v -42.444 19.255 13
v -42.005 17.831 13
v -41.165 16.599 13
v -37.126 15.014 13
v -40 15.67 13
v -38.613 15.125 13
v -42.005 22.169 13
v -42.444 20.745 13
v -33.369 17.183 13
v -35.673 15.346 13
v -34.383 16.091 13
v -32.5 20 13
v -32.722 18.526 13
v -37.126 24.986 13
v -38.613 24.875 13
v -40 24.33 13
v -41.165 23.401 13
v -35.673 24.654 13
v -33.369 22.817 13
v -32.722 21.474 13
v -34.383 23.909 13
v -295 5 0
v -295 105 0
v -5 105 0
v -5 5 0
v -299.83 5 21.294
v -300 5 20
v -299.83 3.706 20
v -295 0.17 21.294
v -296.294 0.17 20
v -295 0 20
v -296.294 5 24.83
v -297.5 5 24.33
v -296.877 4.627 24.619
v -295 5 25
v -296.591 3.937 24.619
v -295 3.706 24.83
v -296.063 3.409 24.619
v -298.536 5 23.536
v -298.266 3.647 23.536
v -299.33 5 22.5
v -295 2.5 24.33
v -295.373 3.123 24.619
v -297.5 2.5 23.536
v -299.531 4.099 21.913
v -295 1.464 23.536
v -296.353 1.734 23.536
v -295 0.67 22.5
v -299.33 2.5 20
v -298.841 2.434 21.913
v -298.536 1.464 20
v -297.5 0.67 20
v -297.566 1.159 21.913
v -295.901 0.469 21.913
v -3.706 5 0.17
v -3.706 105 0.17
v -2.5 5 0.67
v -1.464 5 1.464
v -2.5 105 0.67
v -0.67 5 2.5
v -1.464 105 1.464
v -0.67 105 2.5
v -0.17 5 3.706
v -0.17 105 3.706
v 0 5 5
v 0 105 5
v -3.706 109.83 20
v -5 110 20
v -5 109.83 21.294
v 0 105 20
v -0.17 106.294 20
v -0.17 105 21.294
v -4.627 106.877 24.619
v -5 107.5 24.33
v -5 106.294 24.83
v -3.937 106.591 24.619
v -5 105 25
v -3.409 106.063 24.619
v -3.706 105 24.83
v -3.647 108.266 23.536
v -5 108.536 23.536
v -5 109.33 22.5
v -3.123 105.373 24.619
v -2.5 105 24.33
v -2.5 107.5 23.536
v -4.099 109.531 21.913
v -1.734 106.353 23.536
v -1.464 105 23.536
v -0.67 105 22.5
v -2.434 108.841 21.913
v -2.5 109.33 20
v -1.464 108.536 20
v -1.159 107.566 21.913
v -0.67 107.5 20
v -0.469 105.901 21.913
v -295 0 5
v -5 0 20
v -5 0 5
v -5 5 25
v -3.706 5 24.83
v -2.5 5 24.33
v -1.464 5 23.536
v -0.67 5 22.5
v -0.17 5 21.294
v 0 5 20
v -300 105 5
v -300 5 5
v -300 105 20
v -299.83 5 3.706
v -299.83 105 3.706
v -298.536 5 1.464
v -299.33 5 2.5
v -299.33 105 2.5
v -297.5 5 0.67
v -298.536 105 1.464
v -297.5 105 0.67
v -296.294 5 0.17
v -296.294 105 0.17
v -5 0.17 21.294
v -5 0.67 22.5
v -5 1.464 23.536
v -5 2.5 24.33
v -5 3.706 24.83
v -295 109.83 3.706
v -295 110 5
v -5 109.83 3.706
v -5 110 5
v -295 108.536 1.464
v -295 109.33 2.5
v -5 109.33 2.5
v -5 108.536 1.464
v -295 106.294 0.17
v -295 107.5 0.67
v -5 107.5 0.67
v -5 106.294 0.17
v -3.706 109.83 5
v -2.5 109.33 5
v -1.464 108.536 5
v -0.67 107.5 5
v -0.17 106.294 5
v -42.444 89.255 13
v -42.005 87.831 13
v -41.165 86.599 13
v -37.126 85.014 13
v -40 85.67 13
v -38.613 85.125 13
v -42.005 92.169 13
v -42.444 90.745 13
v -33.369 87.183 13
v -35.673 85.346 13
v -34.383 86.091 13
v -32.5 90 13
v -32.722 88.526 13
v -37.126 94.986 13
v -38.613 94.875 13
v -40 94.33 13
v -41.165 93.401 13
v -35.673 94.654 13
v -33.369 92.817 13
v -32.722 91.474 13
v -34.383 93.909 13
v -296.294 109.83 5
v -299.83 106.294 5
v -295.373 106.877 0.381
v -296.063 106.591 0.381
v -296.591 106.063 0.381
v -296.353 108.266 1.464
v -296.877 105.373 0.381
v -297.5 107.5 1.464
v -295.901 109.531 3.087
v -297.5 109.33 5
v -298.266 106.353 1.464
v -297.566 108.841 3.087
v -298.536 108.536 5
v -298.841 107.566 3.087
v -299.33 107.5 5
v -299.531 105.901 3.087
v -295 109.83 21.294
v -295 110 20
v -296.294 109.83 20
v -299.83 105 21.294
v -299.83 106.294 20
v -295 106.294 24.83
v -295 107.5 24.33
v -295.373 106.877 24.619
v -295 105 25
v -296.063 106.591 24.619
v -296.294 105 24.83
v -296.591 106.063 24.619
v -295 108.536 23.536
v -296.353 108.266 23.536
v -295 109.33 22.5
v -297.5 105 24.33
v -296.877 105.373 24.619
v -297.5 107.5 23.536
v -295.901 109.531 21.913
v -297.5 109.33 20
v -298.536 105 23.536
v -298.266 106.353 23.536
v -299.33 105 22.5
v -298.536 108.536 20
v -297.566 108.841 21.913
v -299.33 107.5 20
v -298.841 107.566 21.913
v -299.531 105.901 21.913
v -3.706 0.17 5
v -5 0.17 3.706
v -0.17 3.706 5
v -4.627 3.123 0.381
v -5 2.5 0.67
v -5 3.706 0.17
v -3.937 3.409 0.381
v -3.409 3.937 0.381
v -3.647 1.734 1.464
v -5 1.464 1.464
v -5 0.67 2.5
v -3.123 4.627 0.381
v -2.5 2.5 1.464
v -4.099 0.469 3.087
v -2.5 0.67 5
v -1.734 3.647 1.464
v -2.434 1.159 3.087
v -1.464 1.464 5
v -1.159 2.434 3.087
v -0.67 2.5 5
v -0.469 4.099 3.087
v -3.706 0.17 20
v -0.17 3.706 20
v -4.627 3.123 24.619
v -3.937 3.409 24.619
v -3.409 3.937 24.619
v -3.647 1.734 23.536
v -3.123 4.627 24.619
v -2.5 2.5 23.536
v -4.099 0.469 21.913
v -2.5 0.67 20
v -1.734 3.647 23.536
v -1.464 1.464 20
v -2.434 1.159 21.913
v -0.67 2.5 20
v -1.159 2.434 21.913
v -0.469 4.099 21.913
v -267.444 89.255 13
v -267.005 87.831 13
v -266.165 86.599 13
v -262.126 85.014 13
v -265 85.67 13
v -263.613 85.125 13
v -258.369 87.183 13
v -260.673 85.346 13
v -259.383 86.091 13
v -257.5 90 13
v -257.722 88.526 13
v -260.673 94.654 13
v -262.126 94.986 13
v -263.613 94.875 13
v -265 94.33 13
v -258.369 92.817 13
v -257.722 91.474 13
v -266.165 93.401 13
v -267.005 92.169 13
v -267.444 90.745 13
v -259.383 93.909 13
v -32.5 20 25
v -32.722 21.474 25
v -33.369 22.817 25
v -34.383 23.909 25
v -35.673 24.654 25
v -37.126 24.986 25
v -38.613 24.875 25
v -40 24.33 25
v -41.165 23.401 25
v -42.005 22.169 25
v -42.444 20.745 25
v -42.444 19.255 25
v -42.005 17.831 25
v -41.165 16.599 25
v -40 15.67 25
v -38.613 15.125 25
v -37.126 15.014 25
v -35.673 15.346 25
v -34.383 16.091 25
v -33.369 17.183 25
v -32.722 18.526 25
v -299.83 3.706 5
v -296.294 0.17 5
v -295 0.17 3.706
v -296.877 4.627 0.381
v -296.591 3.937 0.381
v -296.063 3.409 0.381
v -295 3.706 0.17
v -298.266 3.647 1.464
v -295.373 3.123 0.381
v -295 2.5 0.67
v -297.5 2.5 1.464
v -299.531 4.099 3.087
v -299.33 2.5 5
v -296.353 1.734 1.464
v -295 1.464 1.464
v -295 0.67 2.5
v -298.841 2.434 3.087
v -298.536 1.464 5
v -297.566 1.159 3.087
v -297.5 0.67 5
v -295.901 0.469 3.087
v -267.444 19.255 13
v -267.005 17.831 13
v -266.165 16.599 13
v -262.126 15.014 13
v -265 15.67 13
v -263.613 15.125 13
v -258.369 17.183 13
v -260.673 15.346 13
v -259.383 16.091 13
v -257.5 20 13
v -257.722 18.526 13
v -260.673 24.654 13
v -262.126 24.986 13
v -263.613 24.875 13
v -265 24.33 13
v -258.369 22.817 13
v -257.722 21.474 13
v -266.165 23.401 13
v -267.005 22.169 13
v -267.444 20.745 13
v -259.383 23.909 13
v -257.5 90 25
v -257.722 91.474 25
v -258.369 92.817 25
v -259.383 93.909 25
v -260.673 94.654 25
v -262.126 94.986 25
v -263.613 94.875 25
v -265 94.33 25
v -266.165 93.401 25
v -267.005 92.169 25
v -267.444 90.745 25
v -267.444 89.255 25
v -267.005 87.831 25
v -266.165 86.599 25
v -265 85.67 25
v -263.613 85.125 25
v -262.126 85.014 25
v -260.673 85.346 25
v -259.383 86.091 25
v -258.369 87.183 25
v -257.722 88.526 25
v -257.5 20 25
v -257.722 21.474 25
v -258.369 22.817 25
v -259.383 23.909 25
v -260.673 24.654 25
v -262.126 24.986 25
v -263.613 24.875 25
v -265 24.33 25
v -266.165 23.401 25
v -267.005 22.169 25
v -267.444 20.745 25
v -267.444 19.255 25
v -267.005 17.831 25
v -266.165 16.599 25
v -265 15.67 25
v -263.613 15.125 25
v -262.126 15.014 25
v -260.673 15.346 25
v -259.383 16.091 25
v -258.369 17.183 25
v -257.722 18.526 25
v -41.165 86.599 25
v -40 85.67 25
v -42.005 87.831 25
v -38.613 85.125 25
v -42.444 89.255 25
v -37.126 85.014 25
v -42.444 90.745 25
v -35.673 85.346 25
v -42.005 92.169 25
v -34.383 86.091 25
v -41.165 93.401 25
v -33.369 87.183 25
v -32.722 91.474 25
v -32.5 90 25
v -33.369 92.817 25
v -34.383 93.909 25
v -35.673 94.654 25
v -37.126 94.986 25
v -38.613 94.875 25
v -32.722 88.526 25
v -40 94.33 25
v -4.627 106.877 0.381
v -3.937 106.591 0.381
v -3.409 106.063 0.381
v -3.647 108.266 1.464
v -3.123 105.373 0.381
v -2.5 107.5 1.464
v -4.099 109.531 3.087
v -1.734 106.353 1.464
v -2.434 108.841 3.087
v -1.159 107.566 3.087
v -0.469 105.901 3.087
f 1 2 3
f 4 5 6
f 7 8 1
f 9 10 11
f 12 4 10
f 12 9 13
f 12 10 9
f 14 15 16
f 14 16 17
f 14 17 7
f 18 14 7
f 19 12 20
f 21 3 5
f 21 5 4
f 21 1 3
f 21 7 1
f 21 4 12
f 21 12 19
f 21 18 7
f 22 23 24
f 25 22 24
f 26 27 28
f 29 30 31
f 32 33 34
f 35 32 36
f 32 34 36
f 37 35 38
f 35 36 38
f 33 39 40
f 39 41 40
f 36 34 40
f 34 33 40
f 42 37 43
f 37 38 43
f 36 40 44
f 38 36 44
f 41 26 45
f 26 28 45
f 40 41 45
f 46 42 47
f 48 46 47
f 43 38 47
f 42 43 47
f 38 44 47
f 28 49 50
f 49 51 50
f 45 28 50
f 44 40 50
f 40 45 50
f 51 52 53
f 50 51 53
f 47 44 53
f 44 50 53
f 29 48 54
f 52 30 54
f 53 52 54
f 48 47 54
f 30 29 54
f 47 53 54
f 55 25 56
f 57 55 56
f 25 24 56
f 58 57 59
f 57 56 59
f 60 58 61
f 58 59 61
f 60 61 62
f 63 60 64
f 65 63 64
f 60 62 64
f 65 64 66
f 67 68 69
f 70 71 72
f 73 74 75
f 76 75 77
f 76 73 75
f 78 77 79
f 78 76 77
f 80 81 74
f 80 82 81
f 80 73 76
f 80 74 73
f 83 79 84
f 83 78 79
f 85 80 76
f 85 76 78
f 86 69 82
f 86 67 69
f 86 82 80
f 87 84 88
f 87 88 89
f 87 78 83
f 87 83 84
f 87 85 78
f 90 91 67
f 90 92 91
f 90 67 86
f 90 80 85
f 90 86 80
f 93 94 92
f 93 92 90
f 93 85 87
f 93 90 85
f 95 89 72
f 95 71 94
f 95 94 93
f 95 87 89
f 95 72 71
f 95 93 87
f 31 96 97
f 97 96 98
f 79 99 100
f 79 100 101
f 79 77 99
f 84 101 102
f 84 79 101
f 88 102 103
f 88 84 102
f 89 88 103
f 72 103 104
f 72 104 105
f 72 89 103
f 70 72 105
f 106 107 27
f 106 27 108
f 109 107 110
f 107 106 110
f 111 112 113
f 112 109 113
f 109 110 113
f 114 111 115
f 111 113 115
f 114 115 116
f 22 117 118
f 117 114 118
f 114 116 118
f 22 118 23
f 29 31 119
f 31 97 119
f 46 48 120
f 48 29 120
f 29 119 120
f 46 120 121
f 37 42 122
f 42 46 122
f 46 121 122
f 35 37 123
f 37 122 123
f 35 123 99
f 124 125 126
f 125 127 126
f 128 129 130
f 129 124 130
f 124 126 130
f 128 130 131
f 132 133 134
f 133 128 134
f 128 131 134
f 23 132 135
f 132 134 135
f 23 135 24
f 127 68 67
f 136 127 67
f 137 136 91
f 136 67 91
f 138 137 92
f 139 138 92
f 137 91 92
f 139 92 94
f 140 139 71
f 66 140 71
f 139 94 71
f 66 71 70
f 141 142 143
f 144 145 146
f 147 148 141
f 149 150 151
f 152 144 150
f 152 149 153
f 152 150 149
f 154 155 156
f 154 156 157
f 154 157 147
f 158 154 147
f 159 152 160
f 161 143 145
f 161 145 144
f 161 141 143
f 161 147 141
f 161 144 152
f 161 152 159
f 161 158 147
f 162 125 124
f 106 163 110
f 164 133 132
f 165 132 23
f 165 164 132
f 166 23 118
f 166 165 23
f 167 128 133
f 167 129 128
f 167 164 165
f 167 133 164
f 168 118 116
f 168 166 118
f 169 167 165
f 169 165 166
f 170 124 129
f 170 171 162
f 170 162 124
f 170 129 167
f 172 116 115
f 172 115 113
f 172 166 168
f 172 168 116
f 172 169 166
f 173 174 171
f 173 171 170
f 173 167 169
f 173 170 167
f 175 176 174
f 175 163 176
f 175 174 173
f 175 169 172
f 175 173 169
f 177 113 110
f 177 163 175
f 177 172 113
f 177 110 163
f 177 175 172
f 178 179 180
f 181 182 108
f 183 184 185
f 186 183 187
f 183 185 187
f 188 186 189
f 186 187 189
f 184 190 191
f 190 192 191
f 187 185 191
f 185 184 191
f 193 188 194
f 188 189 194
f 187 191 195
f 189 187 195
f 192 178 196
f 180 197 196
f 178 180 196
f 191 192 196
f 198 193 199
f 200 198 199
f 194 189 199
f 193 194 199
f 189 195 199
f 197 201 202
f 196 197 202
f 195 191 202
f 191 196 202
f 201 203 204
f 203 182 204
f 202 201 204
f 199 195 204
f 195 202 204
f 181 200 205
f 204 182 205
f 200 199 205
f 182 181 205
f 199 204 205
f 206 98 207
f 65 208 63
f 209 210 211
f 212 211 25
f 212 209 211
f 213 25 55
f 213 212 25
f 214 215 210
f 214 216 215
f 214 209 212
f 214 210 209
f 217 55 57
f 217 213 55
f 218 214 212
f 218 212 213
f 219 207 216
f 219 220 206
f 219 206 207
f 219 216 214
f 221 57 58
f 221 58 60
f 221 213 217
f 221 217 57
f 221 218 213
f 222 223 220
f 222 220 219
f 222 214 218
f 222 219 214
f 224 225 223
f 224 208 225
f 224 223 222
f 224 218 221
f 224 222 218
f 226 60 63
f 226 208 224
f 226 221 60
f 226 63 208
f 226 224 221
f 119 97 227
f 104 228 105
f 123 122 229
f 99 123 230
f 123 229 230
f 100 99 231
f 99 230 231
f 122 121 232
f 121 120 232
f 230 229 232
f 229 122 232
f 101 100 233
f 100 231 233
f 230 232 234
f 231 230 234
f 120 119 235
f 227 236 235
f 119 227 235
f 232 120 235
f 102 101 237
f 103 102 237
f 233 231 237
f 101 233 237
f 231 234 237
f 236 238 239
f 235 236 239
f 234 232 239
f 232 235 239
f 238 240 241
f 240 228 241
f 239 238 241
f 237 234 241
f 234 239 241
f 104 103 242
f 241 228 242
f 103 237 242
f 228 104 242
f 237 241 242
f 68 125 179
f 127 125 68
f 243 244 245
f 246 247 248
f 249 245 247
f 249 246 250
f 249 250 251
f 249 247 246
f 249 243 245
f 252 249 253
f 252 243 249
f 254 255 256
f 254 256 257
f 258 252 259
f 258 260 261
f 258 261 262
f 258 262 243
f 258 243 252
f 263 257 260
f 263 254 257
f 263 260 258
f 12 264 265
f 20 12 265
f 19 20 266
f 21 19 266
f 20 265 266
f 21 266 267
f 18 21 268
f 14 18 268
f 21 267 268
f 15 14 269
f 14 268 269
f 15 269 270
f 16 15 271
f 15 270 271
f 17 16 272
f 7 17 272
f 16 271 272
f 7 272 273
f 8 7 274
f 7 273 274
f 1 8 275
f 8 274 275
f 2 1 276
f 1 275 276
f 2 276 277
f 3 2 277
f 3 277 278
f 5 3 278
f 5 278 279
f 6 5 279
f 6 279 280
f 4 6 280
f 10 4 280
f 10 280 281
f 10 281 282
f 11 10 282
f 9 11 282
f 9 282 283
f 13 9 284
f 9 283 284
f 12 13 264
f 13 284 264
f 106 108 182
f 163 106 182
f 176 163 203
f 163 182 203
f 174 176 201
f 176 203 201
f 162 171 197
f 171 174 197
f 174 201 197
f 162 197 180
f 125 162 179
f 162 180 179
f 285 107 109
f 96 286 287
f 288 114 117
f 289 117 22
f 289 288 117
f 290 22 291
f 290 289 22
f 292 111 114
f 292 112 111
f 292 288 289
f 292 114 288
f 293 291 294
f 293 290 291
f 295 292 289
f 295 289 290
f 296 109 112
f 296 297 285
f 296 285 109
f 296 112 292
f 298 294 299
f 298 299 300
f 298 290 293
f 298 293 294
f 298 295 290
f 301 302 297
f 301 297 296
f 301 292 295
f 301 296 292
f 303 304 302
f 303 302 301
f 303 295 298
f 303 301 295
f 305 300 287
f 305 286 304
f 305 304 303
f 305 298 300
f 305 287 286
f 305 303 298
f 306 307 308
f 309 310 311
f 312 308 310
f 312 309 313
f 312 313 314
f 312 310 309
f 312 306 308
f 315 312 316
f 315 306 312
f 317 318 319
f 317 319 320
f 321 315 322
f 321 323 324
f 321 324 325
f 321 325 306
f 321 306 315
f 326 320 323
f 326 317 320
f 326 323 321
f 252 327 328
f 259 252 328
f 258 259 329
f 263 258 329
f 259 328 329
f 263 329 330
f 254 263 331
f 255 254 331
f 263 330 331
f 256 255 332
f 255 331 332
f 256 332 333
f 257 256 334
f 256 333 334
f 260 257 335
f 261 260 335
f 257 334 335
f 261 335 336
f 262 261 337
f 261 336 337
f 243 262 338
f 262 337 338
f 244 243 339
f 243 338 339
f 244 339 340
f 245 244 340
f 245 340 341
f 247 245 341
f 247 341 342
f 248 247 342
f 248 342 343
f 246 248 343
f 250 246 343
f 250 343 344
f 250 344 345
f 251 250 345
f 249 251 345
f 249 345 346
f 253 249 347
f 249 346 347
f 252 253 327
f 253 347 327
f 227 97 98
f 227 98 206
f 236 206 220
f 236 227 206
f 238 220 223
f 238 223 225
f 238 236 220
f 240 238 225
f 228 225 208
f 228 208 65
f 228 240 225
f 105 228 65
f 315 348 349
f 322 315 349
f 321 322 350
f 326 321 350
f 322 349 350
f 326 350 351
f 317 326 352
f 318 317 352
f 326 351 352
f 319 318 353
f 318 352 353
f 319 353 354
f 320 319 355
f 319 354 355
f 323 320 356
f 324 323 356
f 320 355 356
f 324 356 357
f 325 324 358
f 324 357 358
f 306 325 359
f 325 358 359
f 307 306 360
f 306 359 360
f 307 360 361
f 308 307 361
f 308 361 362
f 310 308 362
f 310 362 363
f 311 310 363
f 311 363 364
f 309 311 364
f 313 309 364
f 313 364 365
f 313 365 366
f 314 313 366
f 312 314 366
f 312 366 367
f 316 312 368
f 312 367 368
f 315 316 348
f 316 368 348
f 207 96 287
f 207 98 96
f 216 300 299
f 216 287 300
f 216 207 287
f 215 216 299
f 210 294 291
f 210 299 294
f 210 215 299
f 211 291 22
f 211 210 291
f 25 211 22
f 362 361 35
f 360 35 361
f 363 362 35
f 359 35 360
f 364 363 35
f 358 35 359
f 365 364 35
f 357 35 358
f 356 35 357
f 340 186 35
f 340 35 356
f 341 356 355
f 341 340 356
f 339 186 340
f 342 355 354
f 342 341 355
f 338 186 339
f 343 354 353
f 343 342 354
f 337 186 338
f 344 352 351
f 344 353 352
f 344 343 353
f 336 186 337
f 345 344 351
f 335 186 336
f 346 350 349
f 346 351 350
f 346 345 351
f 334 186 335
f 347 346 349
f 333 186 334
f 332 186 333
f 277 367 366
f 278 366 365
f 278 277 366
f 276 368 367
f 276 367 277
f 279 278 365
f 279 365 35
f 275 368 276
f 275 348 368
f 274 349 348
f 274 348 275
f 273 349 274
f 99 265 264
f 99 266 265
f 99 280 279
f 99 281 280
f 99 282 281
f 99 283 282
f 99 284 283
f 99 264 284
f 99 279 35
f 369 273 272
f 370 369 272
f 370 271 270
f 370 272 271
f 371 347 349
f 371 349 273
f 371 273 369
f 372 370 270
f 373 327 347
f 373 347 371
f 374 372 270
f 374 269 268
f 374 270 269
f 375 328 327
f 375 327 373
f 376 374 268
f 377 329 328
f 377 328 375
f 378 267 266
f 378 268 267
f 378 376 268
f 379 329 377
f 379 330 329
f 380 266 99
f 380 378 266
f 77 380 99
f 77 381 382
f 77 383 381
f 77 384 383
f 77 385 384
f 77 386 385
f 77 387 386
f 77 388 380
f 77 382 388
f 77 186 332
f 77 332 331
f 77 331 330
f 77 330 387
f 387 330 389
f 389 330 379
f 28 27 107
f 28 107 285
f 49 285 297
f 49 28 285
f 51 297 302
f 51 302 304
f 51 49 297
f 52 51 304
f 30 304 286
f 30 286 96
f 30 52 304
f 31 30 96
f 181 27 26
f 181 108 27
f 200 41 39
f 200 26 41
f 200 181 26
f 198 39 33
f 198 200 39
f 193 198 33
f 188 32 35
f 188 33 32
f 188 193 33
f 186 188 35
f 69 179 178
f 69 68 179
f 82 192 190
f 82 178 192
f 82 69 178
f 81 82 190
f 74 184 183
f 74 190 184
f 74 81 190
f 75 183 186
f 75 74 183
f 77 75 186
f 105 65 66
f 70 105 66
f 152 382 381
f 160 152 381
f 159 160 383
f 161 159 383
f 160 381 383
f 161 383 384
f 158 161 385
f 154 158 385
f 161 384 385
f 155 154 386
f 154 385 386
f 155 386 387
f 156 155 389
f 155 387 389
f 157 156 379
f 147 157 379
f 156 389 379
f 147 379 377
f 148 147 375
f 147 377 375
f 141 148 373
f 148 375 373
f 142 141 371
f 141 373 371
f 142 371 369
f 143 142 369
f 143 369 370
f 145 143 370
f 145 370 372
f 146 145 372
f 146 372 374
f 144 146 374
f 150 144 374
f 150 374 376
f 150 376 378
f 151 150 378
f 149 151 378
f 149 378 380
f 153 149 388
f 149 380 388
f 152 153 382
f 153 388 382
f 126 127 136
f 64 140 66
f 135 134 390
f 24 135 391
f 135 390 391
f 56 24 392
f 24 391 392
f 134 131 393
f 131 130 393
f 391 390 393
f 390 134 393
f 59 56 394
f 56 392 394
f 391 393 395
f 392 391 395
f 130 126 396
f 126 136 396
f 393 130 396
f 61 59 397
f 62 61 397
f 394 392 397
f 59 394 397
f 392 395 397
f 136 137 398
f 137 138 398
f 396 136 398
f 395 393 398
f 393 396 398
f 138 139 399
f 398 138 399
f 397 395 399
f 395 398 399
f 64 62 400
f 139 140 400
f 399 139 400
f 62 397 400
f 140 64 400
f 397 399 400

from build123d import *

# Parameters (mm, degrees)
F0_W     = 300
F0_H     = 110
F1_DEPTH = 25
F2_R     = 5
F3_DEPTH = 12
F4_R     = 5


with BuildPart() as f1:
    # F0 (on Top) → F1 (new body)
    with BuildSketch(Plane.XY):
        with Locations((-150, 55)):
            Rectangle(F0_W, F0_H)
    extrude(amount=F1_DEPTH)

    # F2 (on face) → F3 (cut)
    with BuildSketch(Plane.XY.offset(25)):
        with Locations((-262.5, 90)):
            Circle(F2_R)
        with Locations((-262.5, 20)):
            Circle(F2_R)
        with Locations((-37.5, 90)):
            Circle(F2_R)
        with Locations((-37.5, 20)):
            Circle(F2_R)
    extrude(amount=-F3_DEPTH, mode=Mode.SUBTRACT)

    # F4
    f4_edges = [f1.edges().sort_by_distance(p)[0] for p in [
        (0, 110, 12.5),
        (-300, 110, 12.5),
        (-150, 110, 0),
        (-150, 110, 25),
        (-300, 0, 12.5),
        (-300, 55, 0),
        (-300, 55, 25),
        (0, 0, 12.5),
        (-150, 0, 0),
        (-150, 0, 25),
        (0, 55, 0),
        (0, 55, 25),
    ]]
    fillet(f4_edges, radius=F4_R)


solid = f1.part
